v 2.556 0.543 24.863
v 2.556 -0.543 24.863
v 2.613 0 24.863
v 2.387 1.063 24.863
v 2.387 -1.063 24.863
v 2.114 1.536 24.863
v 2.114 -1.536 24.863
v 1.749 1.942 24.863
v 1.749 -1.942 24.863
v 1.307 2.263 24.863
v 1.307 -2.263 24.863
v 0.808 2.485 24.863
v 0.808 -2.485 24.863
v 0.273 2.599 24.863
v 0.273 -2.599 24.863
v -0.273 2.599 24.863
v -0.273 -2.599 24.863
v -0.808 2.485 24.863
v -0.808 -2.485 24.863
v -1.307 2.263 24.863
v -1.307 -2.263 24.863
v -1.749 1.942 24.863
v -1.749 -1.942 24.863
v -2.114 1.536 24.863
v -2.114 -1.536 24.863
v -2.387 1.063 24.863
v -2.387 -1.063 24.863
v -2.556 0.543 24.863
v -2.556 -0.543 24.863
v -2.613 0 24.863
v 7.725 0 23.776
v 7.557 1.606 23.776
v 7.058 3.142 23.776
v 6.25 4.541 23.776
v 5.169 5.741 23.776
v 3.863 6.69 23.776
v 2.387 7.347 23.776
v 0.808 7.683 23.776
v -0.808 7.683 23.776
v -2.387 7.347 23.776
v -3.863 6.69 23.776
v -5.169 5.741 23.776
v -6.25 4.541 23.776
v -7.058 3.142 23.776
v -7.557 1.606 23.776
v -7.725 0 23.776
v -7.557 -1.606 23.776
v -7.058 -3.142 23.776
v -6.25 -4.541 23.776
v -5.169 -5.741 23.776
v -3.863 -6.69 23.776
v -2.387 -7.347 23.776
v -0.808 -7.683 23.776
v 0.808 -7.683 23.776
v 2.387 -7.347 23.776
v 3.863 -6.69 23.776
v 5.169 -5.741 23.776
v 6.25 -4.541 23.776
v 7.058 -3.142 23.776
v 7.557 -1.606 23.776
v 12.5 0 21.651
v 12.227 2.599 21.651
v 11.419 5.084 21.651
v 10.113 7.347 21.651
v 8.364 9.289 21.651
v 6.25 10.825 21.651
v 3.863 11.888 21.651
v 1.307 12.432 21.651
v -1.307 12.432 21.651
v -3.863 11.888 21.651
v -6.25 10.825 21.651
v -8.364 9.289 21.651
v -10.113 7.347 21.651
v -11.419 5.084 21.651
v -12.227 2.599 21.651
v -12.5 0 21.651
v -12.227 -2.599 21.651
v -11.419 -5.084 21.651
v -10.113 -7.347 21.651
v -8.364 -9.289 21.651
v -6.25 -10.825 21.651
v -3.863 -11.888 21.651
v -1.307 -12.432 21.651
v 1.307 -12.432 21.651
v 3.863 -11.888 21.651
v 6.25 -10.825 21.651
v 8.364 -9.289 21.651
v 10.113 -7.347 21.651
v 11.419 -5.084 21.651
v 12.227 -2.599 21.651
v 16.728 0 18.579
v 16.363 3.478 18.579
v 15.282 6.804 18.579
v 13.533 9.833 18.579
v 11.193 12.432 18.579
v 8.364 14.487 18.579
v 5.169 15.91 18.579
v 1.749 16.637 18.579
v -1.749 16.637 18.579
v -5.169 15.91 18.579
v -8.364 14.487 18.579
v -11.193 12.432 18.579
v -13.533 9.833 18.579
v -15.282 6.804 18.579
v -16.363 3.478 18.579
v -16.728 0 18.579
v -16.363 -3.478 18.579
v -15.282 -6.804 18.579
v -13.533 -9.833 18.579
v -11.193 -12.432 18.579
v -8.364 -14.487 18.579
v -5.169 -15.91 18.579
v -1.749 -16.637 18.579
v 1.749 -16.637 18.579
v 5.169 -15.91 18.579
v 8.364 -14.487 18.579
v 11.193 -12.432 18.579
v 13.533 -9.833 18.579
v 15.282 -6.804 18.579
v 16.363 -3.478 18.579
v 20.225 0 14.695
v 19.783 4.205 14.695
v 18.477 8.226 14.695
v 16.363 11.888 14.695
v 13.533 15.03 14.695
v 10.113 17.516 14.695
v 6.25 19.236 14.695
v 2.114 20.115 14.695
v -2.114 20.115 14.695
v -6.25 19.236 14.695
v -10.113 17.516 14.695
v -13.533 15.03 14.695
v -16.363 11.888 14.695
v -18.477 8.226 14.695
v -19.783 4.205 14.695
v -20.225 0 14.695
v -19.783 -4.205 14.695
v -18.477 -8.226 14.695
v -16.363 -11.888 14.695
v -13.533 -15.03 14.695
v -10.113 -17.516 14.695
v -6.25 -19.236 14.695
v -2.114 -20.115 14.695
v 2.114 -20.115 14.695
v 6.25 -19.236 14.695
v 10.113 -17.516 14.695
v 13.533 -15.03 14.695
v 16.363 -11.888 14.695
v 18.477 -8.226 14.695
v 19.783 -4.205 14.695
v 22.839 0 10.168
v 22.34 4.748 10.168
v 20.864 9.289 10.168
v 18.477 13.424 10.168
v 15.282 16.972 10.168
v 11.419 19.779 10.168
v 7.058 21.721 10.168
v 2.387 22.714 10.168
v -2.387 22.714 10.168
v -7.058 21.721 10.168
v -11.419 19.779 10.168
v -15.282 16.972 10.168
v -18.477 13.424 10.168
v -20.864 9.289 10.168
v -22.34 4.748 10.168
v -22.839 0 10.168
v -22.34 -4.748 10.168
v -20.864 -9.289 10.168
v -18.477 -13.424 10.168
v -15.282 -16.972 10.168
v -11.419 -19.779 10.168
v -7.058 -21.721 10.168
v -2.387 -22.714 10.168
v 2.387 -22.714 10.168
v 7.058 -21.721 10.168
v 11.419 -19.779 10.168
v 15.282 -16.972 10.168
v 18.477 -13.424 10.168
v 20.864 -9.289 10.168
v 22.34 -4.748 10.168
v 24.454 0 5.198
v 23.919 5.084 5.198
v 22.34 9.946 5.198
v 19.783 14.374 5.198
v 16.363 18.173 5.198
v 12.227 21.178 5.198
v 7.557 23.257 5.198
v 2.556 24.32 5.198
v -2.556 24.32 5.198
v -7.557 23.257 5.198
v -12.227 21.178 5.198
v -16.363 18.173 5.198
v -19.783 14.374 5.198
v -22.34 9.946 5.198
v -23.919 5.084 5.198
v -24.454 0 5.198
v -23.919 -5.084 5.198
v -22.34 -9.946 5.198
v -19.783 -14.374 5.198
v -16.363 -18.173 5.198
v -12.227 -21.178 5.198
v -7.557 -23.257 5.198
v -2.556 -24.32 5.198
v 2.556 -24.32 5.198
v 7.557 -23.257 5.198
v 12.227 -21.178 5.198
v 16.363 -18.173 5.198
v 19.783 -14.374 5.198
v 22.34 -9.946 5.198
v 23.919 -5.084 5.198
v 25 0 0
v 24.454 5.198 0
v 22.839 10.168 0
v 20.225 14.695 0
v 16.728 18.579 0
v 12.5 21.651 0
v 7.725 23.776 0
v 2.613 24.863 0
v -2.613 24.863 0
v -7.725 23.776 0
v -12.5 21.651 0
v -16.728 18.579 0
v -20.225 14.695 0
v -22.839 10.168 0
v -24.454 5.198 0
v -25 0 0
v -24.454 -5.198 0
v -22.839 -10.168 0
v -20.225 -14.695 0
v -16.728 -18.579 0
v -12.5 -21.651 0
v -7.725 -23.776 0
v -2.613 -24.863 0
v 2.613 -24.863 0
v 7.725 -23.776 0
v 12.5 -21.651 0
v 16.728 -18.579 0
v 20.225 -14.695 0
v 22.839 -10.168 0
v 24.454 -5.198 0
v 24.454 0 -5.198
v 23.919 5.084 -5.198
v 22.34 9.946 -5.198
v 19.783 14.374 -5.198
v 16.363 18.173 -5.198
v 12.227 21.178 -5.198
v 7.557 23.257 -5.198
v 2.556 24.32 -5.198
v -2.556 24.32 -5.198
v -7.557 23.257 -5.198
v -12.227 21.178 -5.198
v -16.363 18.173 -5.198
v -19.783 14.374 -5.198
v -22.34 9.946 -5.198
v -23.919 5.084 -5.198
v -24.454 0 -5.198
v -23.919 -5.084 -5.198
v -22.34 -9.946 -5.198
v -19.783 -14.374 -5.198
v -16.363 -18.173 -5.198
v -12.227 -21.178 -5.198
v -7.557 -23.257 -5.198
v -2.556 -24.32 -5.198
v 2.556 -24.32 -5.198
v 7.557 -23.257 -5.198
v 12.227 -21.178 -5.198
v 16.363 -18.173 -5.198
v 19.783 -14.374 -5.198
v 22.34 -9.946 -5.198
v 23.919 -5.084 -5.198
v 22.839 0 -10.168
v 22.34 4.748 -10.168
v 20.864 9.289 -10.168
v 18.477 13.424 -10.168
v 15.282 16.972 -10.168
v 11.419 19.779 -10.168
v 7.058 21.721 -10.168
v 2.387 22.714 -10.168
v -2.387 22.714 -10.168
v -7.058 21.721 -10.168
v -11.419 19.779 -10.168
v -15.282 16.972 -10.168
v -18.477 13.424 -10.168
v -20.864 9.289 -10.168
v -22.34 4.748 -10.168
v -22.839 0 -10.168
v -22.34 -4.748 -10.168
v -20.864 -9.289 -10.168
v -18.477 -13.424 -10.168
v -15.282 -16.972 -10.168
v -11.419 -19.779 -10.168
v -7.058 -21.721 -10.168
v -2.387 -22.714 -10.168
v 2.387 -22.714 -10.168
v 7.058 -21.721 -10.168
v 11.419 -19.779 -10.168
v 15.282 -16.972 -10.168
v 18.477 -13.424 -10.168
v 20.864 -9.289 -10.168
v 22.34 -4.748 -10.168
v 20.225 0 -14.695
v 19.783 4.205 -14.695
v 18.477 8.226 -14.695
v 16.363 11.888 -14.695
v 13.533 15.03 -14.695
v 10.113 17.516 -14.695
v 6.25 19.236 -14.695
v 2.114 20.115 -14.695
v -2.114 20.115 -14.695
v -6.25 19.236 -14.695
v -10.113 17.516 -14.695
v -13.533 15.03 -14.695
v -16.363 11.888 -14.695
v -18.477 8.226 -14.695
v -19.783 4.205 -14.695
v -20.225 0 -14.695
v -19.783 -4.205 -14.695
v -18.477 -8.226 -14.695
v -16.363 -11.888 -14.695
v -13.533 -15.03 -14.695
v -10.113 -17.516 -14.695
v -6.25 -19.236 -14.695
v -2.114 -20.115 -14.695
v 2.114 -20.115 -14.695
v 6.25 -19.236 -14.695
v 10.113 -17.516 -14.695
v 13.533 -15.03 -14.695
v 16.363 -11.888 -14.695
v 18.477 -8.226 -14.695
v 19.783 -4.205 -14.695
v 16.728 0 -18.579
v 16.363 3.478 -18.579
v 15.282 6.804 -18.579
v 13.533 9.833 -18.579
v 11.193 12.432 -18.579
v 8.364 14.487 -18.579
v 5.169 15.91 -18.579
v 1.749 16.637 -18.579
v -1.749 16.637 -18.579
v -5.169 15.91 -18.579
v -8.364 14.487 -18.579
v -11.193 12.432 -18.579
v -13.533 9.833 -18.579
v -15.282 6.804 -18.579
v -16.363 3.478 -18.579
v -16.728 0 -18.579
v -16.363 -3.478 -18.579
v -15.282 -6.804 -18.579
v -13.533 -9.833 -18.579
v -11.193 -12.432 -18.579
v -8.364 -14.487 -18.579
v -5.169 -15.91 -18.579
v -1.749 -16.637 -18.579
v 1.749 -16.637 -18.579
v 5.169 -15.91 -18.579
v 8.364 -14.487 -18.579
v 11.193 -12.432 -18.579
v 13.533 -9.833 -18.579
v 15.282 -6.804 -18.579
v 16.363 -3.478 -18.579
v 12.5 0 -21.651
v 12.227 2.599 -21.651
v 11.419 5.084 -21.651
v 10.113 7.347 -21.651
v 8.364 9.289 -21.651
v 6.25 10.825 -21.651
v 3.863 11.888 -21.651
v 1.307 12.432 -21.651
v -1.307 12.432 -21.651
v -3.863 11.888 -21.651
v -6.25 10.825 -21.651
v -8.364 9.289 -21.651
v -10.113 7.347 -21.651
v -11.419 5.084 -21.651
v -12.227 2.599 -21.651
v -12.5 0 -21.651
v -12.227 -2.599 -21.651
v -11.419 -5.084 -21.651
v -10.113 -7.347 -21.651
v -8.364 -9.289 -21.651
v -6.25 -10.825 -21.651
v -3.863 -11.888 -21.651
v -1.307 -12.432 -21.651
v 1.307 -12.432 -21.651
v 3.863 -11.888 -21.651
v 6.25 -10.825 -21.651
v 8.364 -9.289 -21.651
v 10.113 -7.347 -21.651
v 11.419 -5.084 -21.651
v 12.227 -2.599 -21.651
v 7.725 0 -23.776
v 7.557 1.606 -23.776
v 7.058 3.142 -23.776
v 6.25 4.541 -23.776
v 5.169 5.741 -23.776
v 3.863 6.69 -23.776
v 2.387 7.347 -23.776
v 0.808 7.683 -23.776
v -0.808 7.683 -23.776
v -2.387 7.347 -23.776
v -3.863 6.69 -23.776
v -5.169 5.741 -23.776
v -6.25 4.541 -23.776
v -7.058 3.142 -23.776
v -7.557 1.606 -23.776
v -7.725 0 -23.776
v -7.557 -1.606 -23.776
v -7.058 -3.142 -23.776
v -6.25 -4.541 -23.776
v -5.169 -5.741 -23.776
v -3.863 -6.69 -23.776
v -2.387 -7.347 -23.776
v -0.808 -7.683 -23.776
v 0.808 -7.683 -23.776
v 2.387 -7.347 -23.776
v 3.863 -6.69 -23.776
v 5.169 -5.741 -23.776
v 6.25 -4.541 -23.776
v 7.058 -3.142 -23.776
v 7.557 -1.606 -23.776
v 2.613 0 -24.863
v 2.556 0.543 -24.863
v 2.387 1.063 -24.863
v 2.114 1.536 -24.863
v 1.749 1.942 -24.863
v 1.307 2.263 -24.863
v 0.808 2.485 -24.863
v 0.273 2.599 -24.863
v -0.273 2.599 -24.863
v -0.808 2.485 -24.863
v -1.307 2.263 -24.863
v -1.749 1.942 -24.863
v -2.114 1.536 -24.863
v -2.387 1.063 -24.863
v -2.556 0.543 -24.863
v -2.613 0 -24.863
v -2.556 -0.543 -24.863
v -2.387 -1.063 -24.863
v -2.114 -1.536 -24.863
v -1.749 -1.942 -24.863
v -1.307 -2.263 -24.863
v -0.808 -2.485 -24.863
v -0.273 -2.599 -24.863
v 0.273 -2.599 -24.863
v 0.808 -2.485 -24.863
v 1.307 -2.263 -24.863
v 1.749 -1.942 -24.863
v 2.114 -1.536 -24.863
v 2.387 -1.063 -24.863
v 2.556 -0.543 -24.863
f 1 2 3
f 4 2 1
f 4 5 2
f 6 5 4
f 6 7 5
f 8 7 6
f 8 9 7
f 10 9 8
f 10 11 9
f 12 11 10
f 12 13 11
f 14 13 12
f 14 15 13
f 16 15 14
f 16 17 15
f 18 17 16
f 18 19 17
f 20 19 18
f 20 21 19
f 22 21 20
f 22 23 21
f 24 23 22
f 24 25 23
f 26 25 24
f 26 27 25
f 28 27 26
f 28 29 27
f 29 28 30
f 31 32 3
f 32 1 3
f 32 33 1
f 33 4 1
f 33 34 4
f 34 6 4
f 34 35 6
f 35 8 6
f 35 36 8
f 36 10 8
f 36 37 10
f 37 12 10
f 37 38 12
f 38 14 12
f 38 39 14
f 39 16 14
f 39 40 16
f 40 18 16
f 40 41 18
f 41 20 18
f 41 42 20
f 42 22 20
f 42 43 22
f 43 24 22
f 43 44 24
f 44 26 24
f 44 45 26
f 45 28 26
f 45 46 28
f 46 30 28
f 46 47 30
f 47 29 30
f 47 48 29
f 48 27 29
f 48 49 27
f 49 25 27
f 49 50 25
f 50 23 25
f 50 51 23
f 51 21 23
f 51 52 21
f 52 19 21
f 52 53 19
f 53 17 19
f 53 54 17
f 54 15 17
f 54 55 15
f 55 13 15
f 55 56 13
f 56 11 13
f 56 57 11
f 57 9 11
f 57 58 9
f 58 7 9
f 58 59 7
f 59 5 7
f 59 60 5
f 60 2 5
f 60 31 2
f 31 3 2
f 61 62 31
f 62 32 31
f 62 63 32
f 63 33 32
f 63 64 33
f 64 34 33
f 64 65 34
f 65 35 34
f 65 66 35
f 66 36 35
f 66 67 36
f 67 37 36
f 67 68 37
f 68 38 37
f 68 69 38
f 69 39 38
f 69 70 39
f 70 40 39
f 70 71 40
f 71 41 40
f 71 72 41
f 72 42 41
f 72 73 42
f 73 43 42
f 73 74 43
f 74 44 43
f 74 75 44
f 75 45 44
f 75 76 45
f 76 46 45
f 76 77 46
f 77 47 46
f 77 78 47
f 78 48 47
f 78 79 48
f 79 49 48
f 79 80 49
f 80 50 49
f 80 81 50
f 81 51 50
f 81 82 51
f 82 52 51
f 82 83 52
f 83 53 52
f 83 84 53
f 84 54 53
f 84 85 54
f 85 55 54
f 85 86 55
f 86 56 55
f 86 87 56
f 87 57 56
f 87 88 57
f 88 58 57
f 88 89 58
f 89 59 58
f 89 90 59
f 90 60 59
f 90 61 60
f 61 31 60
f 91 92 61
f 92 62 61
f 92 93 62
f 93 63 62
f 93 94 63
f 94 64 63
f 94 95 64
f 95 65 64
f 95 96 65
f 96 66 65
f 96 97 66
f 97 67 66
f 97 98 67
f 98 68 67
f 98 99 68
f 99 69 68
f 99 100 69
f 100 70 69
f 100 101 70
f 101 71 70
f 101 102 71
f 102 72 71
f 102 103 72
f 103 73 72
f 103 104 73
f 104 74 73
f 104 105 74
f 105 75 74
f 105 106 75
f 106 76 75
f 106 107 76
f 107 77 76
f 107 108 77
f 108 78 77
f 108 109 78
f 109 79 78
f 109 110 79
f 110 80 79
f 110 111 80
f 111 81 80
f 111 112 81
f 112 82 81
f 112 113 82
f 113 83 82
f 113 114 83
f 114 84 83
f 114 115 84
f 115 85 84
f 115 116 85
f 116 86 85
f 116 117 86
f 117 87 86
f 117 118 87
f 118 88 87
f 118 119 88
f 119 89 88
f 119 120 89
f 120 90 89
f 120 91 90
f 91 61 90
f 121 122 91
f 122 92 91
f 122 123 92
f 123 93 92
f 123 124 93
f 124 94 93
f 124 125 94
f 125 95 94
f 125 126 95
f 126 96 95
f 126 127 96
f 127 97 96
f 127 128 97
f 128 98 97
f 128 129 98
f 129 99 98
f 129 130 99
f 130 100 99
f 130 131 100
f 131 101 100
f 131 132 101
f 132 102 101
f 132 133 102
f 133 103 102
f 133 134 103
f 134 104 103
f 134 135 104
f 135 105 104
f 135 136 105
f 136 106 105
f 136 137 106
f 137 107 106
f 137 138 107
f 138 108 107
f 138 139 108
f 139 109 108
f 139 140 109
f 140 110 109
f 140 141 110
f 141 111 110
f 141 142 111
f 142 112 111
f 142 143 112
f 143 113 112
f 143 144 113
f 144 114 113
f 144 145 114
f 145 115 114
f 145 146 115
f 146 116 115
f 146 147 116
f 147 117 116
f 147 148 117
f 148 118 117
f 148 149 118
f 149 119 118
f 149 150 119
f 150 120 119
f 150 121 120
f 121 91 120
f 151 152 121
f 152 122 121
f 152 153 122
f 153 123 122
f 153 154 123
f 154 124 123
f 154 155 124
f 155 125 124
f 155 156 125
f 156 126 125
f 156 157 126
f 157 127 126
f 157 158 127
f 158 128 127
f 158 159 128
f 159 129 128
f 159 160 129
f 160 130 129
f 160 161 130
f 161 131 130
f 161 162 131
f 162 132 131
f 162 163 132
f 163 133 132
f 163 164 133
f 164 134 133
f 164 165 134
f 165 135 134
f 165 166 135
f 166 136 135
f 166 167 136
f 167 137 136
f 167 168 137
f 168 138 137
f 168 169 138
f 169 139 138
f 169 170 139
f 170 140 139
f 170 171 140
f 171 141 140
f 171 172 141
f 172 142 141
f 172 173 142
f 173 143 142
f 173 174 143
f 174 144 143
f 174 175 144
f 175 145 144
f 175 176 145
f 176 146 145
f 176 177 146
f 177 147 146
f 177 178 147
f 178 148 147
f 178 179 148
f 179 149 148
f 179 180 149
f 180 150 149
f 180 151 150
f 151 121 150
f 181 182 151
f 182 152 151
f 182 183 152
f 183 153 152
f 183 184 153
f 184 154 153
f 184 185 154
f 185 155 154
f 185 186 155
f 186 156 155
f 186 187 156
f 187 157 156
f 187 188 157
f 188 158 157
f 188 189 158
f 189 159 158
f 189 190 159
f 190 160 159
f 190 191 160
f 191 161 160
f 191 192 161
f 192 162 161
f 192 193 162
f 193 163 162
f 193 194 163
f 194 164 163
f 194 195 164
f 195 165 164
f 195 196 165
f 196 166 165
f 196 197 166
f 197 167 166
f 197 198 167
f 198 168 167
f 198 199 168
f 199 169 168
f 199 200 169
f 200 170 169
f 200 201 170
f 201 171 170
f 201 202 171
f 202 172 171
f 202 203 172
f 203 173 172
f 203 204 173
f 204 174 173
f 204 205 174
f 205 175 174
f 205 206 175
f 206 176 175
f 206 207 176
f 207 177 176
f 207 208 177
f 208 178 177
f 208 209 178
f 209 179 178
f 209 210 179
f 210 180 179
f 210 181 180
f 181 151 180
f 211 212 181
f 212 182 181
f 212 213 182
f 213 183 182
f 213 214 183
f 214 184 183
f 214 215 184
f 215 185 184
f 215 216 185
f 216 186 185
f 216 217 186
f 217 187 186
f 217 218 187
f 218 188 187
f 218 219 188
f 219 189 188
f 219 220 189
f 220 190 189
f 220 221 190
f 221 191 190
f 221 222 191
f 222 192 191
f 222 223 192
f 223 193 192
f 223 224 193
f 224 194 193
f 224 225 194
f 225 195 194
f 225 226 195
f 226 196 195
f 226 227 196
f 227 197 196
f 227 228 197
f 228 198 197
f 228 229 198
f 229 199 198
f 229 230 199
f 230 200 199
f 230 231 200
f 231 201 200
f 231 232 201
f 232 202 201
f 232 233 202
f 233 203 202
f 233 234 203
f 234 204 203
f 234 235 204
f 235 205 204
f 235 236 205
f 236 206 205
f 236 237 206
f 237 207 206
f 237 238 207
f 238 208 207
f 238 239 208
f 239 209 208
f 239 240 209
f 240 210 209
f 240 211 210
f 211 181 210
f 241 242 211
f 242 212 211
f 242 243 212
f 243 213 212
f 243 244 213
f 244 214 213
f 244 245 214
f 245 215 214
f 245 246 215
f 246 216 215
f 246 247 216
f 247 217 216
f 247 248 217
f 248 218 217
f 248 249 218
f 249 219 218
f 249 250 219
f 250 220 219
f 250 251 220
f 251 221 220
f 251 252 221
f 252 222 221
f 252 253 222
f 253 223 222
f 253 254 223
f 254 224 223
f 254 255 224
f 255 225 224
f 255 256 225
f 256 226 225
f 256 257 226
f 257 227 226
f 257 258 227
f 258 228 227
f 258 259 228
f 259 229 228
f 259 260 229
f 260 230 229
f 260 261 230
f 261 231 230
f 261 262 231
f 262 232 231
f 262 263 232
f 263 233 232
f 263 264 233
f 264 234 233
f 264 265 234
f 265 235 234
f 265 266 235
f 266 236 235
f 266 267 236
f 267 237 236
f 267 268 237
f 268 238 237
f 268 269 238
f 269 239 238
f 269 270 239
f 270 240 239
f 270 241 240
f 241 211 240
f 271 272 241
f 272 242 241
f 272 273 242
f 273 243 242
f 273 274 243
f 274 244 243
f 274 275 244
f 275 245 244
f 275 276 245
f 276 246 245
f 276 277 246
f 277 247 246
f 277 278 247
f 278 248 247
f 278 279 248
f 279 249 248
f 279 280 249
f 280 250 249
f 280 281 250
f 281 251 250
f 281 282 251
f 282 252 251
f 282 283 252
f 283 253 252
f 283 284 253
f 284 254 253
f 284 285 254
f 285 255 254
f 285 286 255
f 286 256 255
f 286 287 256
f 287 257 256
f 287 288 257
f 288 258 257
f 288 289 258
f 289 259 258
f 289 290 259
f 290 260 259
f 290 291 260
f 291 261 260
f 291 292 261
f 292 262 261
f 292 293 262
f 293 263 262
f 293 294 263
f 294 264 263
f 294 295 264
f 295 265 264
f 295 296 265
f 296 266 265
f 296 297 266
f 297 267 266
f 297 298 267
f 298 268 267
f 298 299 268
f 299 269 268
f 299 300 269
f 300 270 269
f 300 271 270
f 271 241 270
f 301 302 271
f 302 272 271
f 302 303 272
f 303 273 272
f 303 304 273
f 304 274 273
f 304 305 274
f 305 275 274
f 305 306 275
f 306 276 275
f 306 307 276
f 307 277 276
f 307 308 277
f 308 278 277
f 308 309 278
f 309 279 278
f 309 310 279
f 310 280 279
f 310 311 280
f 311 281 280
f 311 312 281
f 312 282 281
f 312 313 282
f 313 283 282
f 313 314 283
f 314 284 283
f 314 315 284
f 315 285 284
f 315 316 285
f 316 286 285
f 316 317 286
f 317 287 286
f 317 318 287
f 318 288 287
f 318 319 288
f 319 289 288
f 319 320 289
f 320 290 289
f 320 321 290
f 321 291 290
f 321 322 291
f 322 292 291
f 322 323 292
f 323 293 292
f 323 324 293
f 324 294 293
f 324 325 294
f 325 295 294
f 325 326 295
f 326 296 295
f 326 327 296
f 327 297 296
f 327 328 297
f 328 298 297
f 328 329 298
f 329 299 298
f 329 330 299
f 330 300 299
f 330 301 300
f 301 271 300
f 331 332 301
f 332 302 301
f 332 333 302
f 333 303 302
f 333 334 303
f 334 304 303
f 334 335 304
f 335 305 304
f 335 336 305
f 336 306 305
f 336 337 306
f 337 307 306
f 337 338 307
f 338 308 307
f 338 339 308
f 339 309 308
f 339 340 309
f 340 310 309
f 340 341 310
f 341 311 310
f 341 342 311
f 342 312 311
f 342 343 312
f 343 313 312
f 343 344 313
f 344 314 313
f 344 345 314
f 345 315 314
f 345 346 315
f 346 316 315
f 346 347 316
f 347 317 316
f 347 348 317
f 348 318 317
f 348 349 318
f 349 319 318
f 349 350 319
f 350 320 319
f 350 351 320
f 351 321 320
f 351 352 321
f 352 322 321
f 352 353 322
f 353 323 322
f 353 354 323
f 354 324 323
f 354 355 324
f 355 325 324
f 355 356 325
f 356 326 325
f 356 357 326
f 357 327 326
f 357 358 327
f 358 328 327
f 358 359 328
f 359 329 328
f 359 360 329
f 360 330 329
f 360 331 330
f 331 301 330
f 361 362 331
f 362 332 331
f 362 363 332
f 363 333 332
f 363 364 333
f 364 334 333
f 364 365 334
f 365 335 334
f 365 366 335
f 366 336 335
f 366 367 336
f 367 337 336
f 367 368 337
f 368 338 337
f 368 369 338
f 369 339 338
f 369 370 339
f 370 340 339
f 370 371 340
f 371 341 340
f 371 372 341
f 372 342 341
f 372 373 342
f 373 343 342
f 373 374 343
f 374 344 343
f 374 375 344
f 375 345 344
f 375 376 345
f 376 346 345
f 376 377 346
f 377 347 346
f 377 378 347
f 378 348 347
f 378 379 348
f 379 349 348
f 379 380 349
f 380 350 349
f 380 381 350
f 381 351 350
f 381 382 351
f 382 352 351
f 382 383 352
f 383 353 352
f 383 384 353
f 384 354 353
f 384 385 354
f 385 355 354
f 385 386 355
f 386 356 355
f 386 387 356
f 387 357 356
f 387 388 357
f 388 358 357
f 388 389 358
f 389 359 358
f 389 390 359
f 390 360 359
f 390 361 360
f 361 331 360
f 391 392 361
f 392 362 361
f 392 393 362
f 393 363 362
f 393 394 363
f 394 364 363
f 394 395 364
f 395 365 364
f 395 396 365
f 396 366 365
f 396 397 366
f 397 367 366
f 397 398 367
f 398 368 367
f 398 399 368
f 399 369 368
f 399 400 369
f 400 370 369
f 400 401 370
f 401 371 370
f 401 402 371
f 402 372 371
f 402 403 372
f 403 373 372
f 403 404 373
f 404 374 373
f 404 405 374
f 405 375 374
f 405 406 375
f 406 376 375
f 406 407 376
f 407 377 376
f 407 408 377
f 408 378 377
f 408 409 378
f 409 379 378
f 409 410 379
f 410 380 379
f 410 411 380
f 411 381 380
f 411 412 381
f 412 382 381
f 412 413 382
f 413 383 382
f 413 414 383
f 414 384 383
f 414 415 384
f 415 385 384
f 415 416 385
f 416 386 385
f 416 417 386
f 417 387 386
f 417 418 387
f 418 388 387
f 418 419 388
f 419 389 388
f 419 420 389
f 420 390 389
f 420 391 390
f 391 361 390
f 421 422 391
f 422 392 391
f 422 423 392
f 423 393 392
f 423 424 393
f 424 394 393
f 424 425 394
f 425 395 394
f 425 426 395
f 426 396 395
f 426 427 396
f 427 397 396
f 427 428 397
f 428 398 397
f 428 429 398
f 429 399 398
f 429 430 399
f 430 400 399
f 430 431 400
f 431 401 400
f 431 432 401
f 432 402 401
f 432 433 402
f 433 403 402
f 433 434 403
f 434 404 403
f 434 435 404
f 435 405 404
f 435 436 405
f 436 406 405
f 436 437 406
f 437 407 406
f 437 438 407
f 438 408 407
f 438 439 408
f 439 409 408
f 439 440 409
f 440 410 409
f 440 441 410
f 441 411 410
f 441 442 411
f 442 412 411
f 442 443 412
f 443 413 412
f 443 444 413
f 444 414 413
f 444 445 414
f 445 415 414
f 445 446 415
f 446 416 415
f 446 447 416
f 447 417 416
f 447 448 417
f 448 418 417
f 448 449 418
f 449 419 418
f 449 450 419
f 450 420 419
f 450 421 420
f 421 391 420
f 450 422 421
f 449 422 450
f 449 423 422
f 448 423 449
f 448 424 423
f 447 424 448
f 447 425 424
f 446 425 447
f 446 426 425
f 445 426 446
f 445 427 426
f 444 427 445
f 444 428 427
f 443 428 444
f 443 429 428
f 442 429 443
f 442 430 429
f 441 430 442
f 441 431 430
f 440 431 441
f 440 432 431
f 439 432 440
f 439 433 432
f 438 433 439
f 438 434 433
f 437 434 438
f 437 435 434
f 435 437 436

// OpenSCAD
union() {
    *sphere(r=9.0);
    *sphere(r=16.0);
    sphere(r=25.0);
};
